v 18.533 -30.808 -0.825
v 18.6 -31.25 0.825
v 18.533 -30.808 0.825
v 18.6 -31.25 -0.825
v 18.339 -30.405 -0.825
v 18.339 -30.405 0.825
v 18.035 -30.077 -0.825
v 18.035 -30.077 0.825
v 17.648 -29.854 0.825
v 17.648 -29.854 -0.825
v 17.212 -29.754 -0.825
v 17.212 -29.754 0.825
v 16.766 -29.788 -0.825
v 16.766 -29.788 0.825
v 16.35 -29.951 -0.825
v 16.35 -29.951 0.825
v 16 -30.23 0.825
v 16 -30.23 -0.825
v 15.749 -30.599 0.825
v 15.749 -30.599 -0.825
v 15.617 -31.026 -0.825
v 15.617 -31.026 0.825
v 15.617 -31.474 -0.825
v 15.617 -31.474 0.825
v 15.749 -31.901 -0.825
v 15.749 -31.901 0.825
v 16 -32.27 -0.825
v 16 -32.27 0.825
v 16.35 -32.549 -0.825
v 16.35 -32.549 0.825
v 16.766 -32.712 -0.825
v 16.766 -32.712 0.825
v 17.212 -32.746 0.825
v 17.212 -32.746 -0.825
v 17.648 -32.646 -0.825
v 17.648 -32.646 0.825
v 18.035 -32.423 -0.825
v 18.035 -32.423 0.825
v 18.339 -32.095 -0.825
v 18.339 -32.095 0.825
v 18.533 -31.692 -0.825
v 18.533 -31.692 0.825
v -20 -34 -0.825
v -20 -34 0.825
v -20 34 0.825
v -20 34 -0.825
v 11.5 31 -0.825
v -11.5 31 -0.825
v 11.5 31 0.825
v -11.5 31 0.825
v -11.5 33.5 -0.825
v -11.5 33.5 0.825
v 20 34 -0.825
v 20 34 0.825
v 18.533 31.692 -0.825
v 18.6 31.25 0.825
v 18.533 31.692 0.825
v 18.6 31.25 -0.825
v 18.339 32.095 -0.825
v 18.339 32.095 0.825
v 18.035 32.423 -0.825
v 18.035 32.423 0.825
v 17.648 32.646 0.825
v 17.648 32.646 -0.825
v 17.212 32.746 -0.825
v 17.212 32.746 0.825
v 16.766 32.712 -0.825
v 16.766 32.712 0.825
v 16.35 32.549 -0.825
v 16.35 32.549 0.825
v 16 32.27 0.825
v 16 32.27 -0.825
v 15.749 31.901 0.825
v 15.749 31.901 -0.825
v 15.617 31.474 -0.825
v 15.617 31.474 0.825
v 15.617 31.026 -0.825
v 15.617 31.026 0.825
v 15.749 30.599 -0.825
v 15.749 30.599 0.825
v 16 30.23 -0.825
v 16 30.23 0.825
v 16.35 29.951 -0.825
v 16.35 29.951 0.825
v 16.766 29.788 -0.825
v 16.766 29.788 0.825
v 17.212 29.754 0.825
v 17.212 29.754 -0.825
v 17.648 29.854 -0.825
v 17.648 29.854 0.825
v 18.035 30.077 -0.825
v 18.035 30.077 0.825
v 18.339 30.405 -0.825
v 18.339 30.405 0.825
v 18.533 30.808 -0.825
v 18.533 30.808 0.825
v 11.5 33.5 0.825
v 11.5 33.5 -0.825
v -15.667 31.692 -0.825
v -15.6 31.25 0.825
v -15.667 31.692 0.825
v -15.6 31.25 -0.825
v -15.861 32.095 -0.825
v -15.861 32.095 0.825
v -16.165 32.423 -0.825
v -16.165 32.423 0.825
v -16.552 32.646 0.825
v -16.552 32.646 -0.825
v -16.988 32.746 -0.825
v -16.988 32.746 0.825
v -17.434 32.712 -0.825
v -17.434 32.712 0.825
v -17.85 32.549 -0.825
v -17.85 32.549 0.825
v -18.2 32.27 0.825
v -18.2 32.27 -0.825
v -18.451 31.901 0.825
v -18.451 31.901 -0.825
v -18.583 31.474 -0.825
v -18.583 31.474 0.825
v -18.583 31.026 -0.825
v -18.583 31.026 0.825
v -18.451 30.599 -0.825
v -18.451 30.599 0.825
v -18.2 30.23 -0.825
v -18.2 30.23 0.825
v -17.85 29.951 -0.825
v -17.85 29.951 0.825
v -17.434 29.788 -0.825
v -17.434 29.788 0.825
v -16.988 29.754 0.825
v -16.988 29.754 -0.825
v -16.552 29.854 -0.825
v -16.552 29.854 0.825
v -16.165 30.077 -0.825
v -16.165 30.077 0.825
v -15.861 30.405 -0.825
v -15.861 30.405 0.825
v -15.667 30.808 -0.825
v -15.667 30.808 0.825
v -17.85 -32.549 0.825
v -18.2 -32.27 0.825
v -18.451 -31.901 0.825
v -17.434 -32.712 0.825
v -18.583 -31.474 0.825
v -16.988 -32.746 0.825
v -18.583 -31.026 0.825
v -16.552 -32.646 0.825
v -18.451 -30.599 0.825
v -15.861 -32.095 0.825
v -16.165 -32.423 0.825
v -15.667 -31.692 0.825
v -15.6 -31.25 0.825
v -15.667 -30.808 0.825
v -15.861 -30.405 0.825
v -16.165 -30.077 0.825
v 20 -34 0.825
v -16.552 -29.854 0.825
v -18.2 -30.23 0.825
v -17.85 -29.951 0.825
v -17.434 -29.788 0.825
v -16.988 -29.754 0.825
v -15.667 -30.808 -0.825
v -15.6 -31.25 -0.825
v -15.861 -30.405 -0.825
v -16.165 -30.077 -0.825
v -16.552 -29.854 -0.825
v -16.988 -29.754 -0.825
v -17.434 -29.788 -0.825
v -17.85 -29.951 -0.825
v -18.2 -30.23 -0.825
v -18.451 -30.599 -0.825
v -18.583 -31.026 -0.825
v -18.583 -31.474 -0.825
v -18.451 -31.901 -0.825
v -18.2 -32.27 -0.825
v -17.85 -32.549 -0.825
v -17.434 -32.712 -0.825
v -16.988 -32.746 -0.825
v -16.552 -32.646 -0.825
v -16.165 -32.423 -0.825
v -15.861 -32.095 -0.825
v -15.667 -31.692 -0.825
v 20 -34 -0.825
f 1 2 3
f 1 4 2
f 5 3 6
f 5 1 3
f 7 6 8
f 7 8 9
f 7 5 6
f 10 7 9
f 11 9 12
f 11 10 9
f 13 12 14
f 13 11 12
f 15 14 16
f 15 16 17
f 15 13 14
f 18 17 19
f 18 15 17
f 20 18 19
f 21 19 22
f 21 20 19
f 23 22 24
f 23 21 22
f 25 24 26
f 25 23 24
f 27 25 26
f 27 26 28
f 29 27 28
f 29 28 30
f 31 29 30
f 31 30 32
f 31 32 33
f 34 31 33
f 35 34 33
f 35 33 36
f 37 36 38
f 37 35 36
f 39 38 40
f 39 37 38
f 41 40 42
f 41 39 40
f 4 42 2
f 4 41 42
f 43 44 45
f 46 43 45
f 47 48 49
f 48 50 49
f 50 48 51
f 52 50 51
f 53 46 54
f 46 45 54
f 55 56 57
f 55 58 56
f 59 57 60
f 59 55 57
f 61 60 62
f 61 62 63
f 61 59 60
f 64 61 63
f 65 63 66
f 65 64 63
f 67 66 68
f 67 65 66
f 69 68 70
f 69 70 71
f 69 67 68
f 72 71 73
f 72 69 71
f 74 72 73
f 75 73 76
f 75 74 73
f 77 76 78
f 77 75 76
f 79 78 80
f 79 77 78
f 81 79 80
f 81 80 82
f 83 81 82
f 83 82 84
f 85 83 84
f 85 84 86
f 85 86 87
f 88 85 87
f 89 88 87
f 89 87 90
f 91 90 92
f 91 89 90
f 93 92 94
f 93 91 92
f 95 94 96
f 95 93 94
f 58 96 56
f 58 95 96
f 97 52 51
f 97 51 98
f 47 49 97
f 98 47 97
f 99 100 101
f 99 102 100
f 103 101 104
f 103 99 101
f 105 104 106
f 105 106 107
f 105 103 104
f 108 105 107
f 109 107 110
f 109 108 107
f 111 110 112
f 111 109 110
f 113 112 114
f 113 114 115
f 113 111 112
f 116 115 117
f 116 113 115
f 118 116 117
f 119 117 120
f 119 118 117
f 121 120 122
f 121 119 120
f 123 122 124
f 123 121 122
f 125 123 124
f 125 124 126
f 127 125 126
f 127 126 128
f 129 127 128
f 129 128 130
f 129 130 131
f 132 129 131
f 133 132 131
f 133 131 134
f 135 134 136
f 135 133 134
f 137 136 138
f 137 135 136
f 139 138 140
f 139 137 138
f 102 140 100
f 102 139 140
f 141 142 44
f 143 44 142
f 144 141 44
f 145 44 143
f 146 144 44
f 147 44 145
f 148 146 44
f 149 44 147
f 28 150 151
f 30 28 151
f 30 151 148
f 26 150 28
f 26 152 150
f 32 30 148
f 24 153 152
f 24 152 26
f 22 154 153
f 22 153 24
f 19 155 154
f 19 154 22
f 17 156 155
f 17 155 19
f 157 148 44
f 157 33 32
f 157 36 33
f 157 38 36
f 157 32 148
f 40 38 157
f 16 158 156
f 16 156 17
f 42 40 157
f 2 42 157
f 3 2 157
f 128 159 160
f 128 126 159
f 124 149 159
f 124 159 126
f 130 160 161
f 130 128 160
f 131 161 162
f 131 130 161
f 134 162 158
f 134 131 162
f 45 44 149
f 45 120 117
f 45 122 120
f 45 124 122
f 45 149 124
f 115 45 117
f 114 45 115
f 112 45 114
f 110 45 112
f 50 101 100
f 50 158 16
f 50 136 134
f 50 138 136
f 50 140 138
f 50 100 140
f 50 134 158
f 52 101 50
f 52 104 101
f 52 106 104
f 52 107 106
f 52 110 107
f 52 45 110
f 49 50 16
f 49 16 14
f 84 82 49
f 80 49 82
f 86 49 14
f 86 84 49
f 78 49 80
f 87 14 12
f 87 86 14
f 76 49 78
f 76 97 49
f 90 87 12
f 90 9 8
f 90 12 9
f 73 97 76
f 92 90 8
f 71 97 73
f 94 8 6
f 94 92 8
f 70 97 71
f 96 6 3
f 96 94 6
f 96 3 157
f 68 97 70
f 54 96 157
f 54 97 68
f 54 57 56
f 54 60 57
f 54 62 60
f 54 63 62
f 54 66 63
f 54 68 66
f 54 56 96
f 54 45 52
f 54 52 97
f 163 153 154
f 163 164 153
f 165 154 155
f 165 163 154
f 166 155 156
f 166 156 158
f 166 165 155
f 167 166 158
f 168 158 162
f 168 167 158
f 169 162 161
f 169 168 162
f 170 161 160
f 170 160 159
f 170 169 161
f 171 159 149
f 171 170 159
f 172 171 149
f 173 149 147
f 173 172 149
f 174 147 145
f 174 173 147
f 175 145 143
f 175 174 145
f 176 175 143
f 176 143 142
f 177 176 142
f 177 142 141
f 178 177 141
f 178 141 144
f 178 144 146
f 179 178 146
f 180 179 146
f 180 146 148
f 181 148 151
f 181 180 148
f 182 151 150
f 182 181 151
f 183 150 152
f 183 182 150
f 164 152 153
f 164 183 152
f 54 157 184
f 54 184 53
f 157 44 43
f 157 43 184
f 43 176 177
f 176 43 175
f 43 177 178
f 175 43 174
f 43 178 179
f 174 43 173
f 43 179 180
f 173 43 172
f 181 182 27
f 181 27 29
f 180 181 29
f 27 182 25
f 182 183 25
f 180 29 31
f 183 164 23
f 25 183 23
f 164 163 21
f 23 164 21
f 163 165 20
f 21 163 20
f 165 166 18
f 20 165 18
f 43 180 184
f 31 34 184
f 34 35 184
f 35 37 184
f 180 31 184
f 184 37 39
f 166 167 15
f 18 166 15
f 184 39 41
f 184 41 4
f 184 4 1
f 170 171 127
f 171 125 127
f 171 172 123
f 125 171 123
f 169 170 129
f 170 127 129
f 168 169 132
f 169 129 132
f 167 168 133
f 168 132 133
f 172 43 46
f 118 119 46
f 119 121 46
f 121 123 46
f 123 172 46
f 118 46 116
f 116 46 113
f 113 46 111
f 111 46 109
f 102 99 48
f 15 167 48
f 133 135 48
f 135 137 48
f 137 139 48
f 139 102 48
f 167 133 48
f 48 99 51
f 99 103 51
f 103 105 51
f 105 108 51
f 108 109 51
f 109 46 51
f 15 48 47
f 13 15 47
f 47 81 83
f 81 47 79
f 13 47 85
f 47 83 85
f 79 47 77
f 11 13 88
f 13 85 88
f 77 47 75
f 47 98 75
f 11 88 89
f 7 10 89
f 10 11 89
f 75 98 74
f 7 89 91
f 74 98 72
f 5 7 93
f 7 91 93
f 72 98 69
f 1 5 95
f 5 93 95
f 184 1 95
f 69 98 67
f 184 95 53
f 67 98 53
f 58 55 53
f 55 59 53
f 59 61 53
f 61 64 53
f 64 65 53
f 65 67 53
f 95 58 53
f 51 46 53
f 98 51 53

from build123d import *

# Parameters (mm, degrees)
SKETCH_W   = 40
SKETCH_H   = 68
SKETCH_R   = 1.5
SKETCH_W_2 = 23
SKETCH_H_2 = 2.5
PAD_DEPTH  = 0.825


with BuildPart() as part:
    # Sketch → Pad (new body, symmetric)
    with BuildSketch(Plane.XY):
        Rectangle(SKETCH_W, SKETCH_H)
        with Locations((-17.1, 31.25)):
            Circle(SKETCH_R, mode=Mode.SUBTRACT)
        with Locations((17.1, 31.25)):
            Circle(SKETCH_R, mode=Mode.SUBTRACT)
        with Locations((-17.1, -31.25)):
            Circle(SKETCH_R, mode=Mode.SUBTRACT)
        with Locations((17.1, -31.25)):
            Circle(SKETCH_R, mode=Mode.SUBTRACT)
        with Locations((0, 32.25)):
            Rectangle(SKETCH_W_2, SKETCH_H_2, mode=Mode.SUBTRACT)
    extrude(amount=PAD_DEPTH, both=True)


solid = part.part
